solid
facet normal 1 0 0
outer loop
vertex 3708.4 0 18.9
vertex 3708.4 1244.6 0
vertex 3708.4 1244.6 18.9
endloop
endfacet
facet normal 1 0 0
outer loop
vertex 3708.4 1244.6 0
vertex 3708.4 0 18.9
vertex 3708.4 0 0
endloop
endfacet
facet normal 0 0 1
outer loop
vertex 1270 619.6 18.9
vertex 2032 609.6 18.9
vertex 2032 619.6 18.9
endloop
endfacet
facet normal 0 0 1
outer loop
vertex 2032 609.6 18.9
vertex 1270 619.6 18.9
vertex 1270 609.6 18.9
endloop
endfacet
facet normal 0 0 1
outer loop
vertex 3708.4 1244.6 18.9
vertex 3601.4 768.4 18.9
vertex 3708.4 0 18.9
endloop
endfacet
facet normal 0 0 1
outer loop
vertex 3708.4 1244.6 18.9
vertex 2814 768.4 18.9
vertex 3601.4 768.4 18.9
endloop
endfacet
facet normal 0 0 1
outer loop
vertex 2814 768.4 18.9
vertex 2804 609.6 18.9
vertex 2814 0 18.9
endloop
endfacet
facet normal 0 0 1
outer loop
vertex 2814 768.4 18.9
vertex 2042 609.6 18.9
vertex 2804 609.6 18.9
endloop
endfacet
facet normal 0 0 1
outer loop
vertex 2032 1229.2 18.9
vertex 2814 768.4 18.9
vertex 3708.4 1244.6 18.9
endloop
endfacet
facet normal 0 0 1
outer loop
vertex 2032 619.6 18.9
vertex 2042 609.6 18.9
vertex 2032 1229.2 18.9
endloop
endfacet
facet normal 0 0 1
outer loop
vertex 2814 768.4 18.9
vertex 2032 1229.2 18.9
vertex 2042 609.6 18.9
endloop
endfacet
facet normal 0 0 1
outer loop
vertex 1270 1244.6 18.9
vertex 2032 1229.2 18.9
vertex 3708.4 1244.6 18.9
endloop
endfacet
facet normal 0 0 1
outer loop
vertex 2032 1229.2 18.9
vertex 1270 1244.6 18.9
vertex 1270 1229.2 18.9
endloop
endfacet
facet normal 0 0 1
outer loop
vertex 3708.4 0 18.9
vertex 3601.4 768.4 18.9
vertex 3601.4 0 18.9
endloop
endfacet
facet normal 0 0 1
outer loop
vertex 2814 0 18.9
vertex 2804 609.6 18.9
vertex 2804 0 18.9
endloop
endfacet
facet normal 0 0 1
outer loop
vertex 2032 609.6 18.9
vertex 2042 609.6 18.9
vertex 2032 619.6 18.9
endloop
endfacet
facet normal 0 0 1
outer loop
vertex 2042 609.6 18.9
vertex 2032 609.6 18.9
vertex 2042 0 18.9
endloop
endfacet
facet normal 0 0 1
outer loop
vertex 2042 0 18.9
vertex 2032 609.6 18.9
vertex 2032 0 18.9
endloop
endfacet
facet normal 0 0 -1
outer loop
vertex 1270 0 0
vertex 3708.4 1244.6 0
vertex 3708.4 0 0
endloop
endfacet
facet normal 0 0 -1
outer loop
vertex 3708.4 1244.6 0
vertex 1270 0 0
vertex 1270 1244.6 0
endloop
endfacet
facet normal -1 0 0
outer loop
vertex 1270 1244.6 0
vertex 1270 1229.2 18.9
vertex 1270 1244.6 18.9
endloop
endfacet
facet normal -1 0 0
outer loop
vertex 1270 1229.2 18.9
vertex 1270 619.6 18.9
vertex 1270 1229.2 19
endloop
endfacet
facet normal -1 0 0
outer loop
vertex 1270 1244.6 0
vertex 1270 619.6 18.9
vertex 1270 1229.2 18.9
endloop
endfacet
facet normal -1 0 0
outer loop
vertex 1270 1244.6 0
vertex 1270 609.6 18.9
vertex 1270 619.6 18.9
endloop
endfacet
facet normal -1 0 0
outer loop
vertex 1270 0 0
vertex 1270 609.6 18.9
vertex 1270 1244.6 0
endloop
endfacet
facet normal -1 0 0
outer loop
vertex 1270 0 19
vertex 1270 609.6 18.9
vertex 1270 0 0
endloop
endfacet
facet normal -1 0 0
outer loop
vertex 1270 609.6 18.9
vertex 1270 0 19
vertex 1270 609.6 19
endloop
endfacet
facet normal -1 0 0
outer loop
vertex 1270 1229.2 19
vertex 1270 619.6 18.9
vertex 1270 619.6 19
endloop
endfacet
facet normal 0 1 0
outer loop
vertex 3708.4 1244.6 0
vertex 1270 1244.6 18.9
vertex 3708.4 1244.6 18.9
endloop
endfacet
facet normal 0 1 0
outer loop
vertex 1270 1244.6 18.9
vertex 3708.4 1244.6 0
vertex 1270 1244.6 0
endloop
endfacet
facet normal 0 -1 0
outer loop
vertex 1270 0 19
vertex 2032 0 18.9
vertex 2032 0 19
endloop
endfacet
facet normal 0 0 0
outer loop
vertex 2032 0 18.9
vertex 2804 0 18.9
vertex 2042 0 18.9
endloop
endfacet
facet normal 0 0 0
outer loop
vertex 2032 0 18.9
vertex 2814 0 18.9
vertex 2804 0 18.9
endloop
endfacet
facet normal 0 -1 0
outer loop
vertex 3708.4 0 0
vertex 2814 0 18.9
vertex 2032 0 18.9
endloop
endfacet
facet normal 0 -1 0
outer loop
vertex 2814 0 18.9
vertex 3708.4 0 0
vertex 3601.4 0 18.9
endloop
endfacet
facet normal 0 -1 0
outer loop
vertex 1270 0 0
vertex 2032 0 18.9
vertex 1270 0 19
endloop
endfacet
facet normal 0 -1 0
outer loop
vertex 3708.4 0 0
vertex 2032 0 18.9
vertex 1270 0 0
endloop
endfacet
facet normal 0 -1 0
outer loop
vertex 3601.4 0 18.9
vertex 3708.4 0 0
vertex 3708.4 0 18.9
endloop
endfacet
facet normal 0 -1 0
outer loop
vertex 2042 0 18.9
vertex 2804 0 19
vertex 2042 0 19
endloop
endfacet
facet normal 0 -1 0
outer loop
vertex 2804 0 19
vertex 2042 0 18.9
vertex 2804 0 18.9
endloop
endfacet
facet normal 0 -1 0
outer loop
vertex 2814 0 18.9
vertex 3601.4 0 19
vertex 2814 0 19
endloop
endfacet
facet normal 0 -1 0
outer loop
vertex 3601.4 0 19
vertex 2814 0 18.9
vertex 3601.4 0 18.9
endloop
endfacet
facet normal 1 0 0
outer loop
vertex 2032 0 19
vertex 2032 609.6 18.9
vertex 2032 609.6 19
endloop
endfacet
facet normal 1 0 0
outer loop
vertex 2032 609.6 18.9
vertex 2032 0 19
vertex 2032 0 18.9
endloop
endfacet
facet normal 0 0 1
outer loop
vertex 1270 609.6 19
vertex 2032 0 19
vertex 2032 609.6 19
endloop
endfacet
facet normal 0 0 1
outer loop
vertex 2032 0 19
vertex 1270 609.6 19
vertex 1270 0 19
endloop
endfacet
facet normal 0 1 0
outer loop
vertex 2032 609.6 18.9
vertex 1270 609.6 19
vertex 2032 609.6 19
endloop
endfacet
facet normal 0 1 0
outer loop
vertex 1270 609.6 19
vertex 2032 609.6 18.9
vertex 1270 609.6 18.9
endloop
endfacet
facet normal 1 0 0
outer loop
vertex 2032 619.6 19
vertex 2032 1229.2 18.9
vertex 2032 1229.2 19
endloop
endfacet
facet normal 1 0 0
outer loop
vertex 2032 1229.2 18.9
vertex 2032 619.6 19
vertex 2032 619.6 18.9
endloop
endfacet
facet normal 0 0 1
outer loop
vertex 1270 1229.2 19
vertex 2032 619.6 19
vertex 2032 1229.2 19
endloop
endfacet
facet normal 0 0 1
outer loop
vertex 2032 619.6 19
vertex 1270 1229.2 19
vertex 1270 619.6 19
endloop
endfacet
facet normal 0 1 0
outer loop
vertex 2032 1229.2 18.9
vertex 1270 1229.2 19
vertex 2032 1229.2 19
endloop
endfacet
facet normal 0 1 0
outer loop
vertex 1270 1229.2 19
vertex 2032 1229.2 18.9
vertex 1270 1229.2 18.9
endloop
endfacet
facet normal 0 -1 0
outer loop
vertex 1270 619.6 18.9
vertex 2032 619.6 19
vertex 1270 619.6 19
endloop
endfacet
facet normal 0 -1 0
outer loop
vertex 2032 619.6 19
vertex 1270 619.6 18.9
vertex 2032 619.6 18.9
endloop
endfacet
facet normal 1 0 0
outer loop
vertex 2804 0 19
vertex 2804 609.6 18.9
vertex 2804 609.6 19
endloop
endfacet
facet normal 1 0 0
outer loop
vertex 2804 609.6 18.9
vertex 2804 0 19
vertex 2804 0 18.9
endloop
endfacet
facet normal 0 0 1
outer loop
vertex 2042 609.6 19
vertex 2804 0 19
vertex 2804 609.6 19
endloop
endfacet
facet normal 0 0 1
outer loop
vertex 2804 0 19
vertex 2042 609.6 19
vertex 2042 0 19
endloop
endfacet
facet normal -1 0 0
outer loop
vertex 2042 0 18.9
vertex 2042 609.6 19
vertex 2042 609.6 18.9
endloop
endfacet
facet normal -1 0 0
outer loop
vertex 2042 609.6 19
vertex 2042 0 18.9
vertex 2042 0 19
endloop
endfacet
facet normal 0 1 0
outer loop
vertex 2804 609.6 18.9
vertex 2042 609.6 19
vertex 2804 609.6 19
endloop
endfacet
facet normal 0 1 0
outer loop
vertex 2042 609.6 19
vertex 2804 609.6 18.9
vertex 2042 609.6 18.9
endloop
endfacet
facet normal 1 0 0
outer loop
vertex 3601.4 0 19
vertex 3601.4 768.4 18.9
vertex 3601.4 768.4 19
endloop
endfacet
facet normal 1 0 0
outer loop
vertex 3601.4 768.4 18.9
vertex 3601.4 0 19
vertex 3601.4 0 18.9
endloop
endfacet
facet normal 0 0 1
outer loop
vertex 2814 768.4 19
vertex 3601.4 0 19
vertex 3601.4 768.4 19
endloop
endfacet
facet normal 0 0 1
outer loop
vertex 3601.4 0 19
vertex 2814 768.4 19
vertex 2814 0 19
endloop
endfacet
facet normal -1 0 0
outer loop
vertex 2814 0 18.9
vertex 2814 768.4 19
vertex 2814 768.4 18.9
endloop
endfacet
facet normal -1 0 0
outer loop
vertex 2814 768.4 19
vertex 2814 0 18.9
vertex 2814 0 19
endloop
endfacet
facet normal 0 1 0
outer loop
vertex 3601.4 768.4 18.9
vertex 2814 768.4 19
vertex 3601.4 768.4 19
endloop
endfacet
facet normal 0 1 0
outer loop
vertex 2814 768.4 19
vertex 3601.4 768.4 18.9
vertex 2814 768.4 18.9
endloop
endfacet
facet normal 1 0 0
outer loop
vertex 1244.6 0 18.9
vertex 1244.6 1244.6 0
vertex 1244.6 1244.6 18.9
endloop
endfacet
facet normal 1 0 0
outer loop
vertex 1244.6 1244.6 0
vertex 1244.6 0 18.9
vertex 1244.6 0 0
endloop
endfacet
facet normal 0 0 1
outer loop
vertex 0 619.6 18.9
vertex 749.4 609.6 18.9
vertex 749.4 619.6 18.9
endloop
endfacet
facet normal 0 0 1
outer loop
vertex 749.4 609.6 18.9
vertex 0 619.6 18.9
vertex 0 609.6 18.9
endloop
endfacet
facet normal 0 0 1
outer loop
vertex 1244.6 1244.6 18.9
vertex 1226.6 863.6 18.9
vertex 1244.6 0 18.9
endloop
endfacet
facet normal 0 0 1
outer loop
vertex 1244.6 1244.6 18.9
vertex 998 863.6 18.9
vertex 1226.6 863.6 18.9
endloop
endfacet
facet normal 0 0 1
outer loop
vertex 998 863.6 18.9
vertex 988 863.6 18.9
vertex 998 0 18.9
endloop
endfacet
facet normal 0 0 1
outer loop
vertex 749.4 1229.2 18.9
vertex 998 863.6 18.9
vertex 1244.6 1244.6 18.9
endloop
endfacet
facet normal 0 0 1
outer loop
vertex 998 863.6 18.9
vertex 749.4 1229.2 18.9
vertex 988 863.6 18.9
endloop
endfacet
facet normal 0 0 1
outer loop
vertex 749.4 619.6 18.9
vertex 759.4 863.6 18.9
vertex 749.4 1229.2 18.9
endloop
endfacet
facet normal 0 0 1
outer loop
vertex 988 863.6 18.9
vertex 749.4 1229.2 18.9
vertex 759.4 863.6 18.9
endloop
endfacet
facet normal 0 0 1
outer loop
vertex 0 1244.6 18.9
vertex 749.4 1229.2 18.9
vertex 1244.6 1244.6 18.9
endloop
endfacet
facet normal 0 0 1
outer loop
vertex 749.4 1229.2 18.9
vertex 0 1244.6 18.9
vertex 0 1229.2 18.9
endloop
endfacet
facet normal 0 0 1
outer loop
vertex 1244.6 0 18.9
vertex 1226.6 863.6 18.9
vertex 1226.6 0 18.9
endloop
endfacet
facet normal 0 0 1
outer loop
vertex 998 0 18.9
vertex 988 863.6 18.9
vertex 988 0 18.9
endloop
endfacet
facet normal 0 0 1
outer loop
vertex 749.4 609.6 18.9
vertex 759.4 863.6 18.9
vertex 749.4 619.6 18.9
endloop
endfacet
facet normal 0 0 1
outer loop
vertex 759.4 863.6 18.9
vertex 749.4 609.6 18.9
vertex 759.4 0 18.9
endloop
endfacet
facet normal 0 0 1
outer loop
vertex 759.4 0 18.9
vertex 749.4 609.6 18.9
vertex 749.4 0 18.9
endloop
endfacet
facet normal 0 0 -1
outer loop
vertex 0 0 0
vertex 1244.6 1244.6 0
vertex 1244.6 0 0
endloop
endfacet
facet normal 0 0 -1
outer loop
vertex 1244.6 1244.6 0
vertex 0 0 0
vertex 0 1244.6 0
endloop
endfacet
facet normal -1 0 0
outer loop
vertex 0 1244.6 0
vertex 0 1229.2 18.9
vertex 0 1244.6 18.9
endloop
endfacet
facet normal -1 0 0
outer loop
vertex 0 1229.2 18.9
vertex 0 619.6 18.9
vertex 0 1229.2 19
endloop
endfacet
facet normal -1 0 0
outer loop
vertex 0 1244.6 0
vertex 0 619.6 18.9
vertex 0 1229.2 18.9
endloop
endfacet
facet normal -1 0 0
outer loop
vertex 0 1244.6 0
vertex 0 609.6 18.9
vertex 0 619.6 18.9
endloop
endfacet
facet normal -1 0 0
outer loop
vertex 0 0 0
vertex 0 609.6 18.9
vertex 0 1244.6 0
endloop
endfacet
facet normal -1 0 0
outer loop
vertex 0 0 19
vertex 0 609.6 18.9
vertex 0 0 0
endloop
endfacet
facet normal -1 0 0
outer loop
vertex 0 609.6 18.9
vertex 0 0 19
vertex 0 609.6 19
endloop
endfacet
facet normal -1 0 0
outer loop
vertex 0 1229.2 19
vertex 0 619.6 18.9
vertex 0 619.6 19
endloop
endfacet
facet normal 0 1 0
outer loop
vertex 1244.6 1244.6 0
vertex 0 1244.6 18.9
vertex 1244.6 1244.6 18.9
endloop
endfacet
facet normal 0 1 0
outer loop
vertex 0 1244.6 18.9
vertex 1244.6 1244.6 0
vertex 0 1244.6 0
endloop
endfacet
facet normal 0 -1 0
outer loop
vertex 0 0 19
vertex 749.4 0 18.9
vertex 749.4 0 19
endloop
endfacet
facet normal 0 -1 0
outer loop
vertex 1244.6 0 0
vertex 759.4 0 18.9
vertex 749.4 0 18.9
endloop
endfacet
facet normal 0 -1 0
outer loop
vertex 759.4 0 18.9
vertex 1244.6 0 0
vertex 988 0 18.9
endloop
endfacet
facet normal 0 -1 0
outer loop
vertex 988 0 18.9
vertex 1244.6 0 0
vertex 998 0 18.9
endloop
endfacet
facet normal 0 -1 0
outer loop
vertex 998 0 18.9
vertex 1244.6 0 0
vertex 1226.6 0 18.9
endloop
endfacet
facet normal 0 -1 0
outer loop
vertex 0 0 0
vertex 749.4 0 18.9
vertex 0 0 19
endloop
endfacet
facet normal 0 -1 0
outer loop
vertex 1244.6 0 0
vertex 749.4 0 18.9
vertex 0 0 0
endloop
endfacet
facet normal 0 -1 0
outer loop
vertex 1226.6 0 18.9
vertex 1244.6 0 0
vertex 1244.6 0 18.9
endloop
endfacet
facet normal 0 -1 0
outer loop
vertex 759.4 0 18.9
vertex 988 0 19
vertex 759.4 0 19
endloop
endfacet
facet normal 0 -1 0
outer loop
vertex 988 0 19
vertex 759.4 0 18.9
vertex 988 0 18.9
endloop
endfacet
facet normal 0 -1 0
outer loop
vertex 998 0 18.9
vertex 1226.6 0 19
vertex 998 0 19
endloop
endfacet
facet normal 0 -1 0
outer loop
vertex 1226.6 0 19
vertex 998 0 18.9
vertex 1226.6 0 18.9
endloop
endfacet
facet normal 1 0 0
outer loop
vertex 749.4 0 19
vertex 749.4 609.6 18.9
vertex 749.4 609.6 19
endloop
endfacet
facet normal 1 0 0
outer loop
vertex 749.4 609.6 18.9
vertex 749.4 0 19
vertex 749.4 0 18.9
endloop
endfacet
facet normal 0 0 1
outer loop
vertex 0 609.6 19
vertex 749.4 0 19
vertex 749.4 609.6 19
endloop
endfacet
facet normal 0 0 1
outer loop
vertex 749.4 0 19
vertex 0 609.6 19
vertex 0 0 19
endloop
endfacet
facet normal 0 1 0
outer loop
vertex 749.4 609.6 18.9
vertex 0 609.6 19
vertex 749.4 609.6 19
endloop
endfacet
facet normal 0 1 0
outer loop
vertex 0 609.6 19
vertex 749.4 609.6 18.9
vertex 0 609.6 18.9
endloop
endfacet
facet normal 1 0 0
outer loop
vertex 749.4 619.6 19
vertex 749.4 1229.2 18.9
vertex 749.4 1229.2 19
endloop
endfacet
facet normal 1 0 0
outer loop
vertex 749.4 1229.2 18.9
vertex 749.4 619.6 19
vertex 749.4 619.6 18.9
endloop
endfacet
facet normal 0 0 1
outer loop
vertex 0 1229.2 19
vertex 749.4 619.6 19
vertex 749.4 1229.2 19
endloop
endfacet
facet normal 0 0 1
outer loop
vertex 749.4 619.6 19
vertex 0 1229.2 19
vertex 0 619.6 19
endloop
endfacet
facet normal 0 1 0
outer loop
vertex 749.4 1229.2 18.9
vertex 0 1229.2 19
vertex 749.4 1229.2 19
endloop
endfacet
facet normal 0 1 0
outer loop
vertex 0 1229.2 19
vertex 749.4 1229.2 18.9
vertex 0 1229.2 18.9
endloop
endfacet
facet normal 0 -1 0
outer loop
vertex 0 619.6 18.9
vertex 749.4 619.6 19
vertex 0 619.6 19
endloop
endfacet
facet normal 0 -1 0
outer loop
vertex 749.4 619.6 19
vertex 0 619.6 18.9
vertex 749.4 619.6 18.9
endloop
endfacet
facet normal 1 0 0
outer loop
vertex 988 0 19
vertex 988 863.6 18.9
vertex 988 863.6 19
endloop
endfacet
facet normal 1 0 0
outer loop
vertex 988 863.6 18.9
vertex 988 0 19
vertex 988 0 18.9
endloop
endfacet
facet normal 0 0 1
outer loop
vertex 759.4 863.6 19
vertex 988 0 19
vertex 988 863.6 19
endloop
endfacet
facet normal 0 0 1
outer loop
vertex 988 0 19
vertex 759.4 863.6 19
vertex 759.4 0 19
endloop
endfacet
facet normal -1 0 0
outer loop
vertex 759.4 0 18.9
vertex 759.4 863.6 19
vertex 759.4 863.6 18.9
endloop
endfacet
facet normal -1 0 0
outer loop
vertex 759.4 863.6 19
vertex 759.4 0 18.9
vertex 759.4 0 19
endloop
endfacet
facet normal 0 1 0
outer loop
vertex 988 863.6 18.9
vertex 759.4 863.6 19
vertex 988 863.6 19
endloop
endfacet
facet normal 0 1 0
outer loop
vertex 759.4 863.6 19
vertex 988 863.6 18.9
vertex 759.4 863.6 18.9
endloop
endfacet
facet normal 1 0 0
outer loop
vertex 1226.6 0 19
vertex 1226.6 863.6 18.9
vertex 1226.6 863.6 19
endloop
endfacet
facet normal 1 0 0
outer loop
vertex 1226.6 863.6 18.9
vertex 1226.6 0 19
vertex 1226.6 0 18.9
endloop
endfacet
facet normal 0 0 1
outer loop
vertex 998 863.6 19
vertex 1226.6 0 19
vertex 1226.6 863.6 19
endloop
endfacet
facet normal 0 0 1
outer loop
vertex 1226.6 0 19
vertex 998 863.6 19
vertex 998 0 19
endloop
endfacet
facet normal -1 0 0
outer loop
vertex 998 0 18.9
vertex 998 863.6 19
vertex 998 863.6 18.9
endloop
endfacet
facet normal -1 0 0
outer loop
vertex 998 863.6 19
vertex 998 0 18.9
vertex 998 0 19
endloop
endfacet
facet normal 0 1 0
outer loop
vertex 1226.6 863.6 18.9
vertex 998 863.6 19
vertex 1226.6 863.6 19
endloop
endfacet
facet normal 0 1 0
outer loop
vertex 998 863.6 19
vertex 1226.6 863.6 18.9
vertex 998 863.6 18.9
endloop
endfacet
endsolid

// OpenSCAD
tw=30*25.4;
th=31*25.4;
td=24*25.4;
ww=9*25.4;
pt=19;
assembled=false;
if(assembled) {
  translate([19,0,pt]) rotate([0,-90]) sidepanel();
  color("green") hpanel();
  translate([tw,0,pt]) rotate([0,-90]) sidepanel();
  translate([0,0,th-pt]) hpanel();
} else {
  #cube([49*25.4,49*25.4,pt-.1]);
  sidepanel();
  translate([0,td+10,0]) sidepanel();
  translate([th-pt*2+10,0]) wing();
  translate([th-pt*2+20+ww,0]) wing();
  translate([50*25.4,0]) {
    #cube([96*25.4,49*25.4,pt-.1]);
    hpanel();
    translate([0,td+10]) hpanel();
    translate([tw+10,0]) hpanel();
    translate([tw*2+20,0]) wingsupport();
  }
}
module wingsupport() {
  color("lightblue") panel(th,th-pt);
}
module wing() {
  color("blue") panel(ww,th+3*25.4);
}
module hpanel() {
  color("green") panel(tw,td);
}
module sidepanel() {
  panel(th-pt*2,td);
}
module panel(w,h,d=pt) {
  cube([w,h,d]);
}
